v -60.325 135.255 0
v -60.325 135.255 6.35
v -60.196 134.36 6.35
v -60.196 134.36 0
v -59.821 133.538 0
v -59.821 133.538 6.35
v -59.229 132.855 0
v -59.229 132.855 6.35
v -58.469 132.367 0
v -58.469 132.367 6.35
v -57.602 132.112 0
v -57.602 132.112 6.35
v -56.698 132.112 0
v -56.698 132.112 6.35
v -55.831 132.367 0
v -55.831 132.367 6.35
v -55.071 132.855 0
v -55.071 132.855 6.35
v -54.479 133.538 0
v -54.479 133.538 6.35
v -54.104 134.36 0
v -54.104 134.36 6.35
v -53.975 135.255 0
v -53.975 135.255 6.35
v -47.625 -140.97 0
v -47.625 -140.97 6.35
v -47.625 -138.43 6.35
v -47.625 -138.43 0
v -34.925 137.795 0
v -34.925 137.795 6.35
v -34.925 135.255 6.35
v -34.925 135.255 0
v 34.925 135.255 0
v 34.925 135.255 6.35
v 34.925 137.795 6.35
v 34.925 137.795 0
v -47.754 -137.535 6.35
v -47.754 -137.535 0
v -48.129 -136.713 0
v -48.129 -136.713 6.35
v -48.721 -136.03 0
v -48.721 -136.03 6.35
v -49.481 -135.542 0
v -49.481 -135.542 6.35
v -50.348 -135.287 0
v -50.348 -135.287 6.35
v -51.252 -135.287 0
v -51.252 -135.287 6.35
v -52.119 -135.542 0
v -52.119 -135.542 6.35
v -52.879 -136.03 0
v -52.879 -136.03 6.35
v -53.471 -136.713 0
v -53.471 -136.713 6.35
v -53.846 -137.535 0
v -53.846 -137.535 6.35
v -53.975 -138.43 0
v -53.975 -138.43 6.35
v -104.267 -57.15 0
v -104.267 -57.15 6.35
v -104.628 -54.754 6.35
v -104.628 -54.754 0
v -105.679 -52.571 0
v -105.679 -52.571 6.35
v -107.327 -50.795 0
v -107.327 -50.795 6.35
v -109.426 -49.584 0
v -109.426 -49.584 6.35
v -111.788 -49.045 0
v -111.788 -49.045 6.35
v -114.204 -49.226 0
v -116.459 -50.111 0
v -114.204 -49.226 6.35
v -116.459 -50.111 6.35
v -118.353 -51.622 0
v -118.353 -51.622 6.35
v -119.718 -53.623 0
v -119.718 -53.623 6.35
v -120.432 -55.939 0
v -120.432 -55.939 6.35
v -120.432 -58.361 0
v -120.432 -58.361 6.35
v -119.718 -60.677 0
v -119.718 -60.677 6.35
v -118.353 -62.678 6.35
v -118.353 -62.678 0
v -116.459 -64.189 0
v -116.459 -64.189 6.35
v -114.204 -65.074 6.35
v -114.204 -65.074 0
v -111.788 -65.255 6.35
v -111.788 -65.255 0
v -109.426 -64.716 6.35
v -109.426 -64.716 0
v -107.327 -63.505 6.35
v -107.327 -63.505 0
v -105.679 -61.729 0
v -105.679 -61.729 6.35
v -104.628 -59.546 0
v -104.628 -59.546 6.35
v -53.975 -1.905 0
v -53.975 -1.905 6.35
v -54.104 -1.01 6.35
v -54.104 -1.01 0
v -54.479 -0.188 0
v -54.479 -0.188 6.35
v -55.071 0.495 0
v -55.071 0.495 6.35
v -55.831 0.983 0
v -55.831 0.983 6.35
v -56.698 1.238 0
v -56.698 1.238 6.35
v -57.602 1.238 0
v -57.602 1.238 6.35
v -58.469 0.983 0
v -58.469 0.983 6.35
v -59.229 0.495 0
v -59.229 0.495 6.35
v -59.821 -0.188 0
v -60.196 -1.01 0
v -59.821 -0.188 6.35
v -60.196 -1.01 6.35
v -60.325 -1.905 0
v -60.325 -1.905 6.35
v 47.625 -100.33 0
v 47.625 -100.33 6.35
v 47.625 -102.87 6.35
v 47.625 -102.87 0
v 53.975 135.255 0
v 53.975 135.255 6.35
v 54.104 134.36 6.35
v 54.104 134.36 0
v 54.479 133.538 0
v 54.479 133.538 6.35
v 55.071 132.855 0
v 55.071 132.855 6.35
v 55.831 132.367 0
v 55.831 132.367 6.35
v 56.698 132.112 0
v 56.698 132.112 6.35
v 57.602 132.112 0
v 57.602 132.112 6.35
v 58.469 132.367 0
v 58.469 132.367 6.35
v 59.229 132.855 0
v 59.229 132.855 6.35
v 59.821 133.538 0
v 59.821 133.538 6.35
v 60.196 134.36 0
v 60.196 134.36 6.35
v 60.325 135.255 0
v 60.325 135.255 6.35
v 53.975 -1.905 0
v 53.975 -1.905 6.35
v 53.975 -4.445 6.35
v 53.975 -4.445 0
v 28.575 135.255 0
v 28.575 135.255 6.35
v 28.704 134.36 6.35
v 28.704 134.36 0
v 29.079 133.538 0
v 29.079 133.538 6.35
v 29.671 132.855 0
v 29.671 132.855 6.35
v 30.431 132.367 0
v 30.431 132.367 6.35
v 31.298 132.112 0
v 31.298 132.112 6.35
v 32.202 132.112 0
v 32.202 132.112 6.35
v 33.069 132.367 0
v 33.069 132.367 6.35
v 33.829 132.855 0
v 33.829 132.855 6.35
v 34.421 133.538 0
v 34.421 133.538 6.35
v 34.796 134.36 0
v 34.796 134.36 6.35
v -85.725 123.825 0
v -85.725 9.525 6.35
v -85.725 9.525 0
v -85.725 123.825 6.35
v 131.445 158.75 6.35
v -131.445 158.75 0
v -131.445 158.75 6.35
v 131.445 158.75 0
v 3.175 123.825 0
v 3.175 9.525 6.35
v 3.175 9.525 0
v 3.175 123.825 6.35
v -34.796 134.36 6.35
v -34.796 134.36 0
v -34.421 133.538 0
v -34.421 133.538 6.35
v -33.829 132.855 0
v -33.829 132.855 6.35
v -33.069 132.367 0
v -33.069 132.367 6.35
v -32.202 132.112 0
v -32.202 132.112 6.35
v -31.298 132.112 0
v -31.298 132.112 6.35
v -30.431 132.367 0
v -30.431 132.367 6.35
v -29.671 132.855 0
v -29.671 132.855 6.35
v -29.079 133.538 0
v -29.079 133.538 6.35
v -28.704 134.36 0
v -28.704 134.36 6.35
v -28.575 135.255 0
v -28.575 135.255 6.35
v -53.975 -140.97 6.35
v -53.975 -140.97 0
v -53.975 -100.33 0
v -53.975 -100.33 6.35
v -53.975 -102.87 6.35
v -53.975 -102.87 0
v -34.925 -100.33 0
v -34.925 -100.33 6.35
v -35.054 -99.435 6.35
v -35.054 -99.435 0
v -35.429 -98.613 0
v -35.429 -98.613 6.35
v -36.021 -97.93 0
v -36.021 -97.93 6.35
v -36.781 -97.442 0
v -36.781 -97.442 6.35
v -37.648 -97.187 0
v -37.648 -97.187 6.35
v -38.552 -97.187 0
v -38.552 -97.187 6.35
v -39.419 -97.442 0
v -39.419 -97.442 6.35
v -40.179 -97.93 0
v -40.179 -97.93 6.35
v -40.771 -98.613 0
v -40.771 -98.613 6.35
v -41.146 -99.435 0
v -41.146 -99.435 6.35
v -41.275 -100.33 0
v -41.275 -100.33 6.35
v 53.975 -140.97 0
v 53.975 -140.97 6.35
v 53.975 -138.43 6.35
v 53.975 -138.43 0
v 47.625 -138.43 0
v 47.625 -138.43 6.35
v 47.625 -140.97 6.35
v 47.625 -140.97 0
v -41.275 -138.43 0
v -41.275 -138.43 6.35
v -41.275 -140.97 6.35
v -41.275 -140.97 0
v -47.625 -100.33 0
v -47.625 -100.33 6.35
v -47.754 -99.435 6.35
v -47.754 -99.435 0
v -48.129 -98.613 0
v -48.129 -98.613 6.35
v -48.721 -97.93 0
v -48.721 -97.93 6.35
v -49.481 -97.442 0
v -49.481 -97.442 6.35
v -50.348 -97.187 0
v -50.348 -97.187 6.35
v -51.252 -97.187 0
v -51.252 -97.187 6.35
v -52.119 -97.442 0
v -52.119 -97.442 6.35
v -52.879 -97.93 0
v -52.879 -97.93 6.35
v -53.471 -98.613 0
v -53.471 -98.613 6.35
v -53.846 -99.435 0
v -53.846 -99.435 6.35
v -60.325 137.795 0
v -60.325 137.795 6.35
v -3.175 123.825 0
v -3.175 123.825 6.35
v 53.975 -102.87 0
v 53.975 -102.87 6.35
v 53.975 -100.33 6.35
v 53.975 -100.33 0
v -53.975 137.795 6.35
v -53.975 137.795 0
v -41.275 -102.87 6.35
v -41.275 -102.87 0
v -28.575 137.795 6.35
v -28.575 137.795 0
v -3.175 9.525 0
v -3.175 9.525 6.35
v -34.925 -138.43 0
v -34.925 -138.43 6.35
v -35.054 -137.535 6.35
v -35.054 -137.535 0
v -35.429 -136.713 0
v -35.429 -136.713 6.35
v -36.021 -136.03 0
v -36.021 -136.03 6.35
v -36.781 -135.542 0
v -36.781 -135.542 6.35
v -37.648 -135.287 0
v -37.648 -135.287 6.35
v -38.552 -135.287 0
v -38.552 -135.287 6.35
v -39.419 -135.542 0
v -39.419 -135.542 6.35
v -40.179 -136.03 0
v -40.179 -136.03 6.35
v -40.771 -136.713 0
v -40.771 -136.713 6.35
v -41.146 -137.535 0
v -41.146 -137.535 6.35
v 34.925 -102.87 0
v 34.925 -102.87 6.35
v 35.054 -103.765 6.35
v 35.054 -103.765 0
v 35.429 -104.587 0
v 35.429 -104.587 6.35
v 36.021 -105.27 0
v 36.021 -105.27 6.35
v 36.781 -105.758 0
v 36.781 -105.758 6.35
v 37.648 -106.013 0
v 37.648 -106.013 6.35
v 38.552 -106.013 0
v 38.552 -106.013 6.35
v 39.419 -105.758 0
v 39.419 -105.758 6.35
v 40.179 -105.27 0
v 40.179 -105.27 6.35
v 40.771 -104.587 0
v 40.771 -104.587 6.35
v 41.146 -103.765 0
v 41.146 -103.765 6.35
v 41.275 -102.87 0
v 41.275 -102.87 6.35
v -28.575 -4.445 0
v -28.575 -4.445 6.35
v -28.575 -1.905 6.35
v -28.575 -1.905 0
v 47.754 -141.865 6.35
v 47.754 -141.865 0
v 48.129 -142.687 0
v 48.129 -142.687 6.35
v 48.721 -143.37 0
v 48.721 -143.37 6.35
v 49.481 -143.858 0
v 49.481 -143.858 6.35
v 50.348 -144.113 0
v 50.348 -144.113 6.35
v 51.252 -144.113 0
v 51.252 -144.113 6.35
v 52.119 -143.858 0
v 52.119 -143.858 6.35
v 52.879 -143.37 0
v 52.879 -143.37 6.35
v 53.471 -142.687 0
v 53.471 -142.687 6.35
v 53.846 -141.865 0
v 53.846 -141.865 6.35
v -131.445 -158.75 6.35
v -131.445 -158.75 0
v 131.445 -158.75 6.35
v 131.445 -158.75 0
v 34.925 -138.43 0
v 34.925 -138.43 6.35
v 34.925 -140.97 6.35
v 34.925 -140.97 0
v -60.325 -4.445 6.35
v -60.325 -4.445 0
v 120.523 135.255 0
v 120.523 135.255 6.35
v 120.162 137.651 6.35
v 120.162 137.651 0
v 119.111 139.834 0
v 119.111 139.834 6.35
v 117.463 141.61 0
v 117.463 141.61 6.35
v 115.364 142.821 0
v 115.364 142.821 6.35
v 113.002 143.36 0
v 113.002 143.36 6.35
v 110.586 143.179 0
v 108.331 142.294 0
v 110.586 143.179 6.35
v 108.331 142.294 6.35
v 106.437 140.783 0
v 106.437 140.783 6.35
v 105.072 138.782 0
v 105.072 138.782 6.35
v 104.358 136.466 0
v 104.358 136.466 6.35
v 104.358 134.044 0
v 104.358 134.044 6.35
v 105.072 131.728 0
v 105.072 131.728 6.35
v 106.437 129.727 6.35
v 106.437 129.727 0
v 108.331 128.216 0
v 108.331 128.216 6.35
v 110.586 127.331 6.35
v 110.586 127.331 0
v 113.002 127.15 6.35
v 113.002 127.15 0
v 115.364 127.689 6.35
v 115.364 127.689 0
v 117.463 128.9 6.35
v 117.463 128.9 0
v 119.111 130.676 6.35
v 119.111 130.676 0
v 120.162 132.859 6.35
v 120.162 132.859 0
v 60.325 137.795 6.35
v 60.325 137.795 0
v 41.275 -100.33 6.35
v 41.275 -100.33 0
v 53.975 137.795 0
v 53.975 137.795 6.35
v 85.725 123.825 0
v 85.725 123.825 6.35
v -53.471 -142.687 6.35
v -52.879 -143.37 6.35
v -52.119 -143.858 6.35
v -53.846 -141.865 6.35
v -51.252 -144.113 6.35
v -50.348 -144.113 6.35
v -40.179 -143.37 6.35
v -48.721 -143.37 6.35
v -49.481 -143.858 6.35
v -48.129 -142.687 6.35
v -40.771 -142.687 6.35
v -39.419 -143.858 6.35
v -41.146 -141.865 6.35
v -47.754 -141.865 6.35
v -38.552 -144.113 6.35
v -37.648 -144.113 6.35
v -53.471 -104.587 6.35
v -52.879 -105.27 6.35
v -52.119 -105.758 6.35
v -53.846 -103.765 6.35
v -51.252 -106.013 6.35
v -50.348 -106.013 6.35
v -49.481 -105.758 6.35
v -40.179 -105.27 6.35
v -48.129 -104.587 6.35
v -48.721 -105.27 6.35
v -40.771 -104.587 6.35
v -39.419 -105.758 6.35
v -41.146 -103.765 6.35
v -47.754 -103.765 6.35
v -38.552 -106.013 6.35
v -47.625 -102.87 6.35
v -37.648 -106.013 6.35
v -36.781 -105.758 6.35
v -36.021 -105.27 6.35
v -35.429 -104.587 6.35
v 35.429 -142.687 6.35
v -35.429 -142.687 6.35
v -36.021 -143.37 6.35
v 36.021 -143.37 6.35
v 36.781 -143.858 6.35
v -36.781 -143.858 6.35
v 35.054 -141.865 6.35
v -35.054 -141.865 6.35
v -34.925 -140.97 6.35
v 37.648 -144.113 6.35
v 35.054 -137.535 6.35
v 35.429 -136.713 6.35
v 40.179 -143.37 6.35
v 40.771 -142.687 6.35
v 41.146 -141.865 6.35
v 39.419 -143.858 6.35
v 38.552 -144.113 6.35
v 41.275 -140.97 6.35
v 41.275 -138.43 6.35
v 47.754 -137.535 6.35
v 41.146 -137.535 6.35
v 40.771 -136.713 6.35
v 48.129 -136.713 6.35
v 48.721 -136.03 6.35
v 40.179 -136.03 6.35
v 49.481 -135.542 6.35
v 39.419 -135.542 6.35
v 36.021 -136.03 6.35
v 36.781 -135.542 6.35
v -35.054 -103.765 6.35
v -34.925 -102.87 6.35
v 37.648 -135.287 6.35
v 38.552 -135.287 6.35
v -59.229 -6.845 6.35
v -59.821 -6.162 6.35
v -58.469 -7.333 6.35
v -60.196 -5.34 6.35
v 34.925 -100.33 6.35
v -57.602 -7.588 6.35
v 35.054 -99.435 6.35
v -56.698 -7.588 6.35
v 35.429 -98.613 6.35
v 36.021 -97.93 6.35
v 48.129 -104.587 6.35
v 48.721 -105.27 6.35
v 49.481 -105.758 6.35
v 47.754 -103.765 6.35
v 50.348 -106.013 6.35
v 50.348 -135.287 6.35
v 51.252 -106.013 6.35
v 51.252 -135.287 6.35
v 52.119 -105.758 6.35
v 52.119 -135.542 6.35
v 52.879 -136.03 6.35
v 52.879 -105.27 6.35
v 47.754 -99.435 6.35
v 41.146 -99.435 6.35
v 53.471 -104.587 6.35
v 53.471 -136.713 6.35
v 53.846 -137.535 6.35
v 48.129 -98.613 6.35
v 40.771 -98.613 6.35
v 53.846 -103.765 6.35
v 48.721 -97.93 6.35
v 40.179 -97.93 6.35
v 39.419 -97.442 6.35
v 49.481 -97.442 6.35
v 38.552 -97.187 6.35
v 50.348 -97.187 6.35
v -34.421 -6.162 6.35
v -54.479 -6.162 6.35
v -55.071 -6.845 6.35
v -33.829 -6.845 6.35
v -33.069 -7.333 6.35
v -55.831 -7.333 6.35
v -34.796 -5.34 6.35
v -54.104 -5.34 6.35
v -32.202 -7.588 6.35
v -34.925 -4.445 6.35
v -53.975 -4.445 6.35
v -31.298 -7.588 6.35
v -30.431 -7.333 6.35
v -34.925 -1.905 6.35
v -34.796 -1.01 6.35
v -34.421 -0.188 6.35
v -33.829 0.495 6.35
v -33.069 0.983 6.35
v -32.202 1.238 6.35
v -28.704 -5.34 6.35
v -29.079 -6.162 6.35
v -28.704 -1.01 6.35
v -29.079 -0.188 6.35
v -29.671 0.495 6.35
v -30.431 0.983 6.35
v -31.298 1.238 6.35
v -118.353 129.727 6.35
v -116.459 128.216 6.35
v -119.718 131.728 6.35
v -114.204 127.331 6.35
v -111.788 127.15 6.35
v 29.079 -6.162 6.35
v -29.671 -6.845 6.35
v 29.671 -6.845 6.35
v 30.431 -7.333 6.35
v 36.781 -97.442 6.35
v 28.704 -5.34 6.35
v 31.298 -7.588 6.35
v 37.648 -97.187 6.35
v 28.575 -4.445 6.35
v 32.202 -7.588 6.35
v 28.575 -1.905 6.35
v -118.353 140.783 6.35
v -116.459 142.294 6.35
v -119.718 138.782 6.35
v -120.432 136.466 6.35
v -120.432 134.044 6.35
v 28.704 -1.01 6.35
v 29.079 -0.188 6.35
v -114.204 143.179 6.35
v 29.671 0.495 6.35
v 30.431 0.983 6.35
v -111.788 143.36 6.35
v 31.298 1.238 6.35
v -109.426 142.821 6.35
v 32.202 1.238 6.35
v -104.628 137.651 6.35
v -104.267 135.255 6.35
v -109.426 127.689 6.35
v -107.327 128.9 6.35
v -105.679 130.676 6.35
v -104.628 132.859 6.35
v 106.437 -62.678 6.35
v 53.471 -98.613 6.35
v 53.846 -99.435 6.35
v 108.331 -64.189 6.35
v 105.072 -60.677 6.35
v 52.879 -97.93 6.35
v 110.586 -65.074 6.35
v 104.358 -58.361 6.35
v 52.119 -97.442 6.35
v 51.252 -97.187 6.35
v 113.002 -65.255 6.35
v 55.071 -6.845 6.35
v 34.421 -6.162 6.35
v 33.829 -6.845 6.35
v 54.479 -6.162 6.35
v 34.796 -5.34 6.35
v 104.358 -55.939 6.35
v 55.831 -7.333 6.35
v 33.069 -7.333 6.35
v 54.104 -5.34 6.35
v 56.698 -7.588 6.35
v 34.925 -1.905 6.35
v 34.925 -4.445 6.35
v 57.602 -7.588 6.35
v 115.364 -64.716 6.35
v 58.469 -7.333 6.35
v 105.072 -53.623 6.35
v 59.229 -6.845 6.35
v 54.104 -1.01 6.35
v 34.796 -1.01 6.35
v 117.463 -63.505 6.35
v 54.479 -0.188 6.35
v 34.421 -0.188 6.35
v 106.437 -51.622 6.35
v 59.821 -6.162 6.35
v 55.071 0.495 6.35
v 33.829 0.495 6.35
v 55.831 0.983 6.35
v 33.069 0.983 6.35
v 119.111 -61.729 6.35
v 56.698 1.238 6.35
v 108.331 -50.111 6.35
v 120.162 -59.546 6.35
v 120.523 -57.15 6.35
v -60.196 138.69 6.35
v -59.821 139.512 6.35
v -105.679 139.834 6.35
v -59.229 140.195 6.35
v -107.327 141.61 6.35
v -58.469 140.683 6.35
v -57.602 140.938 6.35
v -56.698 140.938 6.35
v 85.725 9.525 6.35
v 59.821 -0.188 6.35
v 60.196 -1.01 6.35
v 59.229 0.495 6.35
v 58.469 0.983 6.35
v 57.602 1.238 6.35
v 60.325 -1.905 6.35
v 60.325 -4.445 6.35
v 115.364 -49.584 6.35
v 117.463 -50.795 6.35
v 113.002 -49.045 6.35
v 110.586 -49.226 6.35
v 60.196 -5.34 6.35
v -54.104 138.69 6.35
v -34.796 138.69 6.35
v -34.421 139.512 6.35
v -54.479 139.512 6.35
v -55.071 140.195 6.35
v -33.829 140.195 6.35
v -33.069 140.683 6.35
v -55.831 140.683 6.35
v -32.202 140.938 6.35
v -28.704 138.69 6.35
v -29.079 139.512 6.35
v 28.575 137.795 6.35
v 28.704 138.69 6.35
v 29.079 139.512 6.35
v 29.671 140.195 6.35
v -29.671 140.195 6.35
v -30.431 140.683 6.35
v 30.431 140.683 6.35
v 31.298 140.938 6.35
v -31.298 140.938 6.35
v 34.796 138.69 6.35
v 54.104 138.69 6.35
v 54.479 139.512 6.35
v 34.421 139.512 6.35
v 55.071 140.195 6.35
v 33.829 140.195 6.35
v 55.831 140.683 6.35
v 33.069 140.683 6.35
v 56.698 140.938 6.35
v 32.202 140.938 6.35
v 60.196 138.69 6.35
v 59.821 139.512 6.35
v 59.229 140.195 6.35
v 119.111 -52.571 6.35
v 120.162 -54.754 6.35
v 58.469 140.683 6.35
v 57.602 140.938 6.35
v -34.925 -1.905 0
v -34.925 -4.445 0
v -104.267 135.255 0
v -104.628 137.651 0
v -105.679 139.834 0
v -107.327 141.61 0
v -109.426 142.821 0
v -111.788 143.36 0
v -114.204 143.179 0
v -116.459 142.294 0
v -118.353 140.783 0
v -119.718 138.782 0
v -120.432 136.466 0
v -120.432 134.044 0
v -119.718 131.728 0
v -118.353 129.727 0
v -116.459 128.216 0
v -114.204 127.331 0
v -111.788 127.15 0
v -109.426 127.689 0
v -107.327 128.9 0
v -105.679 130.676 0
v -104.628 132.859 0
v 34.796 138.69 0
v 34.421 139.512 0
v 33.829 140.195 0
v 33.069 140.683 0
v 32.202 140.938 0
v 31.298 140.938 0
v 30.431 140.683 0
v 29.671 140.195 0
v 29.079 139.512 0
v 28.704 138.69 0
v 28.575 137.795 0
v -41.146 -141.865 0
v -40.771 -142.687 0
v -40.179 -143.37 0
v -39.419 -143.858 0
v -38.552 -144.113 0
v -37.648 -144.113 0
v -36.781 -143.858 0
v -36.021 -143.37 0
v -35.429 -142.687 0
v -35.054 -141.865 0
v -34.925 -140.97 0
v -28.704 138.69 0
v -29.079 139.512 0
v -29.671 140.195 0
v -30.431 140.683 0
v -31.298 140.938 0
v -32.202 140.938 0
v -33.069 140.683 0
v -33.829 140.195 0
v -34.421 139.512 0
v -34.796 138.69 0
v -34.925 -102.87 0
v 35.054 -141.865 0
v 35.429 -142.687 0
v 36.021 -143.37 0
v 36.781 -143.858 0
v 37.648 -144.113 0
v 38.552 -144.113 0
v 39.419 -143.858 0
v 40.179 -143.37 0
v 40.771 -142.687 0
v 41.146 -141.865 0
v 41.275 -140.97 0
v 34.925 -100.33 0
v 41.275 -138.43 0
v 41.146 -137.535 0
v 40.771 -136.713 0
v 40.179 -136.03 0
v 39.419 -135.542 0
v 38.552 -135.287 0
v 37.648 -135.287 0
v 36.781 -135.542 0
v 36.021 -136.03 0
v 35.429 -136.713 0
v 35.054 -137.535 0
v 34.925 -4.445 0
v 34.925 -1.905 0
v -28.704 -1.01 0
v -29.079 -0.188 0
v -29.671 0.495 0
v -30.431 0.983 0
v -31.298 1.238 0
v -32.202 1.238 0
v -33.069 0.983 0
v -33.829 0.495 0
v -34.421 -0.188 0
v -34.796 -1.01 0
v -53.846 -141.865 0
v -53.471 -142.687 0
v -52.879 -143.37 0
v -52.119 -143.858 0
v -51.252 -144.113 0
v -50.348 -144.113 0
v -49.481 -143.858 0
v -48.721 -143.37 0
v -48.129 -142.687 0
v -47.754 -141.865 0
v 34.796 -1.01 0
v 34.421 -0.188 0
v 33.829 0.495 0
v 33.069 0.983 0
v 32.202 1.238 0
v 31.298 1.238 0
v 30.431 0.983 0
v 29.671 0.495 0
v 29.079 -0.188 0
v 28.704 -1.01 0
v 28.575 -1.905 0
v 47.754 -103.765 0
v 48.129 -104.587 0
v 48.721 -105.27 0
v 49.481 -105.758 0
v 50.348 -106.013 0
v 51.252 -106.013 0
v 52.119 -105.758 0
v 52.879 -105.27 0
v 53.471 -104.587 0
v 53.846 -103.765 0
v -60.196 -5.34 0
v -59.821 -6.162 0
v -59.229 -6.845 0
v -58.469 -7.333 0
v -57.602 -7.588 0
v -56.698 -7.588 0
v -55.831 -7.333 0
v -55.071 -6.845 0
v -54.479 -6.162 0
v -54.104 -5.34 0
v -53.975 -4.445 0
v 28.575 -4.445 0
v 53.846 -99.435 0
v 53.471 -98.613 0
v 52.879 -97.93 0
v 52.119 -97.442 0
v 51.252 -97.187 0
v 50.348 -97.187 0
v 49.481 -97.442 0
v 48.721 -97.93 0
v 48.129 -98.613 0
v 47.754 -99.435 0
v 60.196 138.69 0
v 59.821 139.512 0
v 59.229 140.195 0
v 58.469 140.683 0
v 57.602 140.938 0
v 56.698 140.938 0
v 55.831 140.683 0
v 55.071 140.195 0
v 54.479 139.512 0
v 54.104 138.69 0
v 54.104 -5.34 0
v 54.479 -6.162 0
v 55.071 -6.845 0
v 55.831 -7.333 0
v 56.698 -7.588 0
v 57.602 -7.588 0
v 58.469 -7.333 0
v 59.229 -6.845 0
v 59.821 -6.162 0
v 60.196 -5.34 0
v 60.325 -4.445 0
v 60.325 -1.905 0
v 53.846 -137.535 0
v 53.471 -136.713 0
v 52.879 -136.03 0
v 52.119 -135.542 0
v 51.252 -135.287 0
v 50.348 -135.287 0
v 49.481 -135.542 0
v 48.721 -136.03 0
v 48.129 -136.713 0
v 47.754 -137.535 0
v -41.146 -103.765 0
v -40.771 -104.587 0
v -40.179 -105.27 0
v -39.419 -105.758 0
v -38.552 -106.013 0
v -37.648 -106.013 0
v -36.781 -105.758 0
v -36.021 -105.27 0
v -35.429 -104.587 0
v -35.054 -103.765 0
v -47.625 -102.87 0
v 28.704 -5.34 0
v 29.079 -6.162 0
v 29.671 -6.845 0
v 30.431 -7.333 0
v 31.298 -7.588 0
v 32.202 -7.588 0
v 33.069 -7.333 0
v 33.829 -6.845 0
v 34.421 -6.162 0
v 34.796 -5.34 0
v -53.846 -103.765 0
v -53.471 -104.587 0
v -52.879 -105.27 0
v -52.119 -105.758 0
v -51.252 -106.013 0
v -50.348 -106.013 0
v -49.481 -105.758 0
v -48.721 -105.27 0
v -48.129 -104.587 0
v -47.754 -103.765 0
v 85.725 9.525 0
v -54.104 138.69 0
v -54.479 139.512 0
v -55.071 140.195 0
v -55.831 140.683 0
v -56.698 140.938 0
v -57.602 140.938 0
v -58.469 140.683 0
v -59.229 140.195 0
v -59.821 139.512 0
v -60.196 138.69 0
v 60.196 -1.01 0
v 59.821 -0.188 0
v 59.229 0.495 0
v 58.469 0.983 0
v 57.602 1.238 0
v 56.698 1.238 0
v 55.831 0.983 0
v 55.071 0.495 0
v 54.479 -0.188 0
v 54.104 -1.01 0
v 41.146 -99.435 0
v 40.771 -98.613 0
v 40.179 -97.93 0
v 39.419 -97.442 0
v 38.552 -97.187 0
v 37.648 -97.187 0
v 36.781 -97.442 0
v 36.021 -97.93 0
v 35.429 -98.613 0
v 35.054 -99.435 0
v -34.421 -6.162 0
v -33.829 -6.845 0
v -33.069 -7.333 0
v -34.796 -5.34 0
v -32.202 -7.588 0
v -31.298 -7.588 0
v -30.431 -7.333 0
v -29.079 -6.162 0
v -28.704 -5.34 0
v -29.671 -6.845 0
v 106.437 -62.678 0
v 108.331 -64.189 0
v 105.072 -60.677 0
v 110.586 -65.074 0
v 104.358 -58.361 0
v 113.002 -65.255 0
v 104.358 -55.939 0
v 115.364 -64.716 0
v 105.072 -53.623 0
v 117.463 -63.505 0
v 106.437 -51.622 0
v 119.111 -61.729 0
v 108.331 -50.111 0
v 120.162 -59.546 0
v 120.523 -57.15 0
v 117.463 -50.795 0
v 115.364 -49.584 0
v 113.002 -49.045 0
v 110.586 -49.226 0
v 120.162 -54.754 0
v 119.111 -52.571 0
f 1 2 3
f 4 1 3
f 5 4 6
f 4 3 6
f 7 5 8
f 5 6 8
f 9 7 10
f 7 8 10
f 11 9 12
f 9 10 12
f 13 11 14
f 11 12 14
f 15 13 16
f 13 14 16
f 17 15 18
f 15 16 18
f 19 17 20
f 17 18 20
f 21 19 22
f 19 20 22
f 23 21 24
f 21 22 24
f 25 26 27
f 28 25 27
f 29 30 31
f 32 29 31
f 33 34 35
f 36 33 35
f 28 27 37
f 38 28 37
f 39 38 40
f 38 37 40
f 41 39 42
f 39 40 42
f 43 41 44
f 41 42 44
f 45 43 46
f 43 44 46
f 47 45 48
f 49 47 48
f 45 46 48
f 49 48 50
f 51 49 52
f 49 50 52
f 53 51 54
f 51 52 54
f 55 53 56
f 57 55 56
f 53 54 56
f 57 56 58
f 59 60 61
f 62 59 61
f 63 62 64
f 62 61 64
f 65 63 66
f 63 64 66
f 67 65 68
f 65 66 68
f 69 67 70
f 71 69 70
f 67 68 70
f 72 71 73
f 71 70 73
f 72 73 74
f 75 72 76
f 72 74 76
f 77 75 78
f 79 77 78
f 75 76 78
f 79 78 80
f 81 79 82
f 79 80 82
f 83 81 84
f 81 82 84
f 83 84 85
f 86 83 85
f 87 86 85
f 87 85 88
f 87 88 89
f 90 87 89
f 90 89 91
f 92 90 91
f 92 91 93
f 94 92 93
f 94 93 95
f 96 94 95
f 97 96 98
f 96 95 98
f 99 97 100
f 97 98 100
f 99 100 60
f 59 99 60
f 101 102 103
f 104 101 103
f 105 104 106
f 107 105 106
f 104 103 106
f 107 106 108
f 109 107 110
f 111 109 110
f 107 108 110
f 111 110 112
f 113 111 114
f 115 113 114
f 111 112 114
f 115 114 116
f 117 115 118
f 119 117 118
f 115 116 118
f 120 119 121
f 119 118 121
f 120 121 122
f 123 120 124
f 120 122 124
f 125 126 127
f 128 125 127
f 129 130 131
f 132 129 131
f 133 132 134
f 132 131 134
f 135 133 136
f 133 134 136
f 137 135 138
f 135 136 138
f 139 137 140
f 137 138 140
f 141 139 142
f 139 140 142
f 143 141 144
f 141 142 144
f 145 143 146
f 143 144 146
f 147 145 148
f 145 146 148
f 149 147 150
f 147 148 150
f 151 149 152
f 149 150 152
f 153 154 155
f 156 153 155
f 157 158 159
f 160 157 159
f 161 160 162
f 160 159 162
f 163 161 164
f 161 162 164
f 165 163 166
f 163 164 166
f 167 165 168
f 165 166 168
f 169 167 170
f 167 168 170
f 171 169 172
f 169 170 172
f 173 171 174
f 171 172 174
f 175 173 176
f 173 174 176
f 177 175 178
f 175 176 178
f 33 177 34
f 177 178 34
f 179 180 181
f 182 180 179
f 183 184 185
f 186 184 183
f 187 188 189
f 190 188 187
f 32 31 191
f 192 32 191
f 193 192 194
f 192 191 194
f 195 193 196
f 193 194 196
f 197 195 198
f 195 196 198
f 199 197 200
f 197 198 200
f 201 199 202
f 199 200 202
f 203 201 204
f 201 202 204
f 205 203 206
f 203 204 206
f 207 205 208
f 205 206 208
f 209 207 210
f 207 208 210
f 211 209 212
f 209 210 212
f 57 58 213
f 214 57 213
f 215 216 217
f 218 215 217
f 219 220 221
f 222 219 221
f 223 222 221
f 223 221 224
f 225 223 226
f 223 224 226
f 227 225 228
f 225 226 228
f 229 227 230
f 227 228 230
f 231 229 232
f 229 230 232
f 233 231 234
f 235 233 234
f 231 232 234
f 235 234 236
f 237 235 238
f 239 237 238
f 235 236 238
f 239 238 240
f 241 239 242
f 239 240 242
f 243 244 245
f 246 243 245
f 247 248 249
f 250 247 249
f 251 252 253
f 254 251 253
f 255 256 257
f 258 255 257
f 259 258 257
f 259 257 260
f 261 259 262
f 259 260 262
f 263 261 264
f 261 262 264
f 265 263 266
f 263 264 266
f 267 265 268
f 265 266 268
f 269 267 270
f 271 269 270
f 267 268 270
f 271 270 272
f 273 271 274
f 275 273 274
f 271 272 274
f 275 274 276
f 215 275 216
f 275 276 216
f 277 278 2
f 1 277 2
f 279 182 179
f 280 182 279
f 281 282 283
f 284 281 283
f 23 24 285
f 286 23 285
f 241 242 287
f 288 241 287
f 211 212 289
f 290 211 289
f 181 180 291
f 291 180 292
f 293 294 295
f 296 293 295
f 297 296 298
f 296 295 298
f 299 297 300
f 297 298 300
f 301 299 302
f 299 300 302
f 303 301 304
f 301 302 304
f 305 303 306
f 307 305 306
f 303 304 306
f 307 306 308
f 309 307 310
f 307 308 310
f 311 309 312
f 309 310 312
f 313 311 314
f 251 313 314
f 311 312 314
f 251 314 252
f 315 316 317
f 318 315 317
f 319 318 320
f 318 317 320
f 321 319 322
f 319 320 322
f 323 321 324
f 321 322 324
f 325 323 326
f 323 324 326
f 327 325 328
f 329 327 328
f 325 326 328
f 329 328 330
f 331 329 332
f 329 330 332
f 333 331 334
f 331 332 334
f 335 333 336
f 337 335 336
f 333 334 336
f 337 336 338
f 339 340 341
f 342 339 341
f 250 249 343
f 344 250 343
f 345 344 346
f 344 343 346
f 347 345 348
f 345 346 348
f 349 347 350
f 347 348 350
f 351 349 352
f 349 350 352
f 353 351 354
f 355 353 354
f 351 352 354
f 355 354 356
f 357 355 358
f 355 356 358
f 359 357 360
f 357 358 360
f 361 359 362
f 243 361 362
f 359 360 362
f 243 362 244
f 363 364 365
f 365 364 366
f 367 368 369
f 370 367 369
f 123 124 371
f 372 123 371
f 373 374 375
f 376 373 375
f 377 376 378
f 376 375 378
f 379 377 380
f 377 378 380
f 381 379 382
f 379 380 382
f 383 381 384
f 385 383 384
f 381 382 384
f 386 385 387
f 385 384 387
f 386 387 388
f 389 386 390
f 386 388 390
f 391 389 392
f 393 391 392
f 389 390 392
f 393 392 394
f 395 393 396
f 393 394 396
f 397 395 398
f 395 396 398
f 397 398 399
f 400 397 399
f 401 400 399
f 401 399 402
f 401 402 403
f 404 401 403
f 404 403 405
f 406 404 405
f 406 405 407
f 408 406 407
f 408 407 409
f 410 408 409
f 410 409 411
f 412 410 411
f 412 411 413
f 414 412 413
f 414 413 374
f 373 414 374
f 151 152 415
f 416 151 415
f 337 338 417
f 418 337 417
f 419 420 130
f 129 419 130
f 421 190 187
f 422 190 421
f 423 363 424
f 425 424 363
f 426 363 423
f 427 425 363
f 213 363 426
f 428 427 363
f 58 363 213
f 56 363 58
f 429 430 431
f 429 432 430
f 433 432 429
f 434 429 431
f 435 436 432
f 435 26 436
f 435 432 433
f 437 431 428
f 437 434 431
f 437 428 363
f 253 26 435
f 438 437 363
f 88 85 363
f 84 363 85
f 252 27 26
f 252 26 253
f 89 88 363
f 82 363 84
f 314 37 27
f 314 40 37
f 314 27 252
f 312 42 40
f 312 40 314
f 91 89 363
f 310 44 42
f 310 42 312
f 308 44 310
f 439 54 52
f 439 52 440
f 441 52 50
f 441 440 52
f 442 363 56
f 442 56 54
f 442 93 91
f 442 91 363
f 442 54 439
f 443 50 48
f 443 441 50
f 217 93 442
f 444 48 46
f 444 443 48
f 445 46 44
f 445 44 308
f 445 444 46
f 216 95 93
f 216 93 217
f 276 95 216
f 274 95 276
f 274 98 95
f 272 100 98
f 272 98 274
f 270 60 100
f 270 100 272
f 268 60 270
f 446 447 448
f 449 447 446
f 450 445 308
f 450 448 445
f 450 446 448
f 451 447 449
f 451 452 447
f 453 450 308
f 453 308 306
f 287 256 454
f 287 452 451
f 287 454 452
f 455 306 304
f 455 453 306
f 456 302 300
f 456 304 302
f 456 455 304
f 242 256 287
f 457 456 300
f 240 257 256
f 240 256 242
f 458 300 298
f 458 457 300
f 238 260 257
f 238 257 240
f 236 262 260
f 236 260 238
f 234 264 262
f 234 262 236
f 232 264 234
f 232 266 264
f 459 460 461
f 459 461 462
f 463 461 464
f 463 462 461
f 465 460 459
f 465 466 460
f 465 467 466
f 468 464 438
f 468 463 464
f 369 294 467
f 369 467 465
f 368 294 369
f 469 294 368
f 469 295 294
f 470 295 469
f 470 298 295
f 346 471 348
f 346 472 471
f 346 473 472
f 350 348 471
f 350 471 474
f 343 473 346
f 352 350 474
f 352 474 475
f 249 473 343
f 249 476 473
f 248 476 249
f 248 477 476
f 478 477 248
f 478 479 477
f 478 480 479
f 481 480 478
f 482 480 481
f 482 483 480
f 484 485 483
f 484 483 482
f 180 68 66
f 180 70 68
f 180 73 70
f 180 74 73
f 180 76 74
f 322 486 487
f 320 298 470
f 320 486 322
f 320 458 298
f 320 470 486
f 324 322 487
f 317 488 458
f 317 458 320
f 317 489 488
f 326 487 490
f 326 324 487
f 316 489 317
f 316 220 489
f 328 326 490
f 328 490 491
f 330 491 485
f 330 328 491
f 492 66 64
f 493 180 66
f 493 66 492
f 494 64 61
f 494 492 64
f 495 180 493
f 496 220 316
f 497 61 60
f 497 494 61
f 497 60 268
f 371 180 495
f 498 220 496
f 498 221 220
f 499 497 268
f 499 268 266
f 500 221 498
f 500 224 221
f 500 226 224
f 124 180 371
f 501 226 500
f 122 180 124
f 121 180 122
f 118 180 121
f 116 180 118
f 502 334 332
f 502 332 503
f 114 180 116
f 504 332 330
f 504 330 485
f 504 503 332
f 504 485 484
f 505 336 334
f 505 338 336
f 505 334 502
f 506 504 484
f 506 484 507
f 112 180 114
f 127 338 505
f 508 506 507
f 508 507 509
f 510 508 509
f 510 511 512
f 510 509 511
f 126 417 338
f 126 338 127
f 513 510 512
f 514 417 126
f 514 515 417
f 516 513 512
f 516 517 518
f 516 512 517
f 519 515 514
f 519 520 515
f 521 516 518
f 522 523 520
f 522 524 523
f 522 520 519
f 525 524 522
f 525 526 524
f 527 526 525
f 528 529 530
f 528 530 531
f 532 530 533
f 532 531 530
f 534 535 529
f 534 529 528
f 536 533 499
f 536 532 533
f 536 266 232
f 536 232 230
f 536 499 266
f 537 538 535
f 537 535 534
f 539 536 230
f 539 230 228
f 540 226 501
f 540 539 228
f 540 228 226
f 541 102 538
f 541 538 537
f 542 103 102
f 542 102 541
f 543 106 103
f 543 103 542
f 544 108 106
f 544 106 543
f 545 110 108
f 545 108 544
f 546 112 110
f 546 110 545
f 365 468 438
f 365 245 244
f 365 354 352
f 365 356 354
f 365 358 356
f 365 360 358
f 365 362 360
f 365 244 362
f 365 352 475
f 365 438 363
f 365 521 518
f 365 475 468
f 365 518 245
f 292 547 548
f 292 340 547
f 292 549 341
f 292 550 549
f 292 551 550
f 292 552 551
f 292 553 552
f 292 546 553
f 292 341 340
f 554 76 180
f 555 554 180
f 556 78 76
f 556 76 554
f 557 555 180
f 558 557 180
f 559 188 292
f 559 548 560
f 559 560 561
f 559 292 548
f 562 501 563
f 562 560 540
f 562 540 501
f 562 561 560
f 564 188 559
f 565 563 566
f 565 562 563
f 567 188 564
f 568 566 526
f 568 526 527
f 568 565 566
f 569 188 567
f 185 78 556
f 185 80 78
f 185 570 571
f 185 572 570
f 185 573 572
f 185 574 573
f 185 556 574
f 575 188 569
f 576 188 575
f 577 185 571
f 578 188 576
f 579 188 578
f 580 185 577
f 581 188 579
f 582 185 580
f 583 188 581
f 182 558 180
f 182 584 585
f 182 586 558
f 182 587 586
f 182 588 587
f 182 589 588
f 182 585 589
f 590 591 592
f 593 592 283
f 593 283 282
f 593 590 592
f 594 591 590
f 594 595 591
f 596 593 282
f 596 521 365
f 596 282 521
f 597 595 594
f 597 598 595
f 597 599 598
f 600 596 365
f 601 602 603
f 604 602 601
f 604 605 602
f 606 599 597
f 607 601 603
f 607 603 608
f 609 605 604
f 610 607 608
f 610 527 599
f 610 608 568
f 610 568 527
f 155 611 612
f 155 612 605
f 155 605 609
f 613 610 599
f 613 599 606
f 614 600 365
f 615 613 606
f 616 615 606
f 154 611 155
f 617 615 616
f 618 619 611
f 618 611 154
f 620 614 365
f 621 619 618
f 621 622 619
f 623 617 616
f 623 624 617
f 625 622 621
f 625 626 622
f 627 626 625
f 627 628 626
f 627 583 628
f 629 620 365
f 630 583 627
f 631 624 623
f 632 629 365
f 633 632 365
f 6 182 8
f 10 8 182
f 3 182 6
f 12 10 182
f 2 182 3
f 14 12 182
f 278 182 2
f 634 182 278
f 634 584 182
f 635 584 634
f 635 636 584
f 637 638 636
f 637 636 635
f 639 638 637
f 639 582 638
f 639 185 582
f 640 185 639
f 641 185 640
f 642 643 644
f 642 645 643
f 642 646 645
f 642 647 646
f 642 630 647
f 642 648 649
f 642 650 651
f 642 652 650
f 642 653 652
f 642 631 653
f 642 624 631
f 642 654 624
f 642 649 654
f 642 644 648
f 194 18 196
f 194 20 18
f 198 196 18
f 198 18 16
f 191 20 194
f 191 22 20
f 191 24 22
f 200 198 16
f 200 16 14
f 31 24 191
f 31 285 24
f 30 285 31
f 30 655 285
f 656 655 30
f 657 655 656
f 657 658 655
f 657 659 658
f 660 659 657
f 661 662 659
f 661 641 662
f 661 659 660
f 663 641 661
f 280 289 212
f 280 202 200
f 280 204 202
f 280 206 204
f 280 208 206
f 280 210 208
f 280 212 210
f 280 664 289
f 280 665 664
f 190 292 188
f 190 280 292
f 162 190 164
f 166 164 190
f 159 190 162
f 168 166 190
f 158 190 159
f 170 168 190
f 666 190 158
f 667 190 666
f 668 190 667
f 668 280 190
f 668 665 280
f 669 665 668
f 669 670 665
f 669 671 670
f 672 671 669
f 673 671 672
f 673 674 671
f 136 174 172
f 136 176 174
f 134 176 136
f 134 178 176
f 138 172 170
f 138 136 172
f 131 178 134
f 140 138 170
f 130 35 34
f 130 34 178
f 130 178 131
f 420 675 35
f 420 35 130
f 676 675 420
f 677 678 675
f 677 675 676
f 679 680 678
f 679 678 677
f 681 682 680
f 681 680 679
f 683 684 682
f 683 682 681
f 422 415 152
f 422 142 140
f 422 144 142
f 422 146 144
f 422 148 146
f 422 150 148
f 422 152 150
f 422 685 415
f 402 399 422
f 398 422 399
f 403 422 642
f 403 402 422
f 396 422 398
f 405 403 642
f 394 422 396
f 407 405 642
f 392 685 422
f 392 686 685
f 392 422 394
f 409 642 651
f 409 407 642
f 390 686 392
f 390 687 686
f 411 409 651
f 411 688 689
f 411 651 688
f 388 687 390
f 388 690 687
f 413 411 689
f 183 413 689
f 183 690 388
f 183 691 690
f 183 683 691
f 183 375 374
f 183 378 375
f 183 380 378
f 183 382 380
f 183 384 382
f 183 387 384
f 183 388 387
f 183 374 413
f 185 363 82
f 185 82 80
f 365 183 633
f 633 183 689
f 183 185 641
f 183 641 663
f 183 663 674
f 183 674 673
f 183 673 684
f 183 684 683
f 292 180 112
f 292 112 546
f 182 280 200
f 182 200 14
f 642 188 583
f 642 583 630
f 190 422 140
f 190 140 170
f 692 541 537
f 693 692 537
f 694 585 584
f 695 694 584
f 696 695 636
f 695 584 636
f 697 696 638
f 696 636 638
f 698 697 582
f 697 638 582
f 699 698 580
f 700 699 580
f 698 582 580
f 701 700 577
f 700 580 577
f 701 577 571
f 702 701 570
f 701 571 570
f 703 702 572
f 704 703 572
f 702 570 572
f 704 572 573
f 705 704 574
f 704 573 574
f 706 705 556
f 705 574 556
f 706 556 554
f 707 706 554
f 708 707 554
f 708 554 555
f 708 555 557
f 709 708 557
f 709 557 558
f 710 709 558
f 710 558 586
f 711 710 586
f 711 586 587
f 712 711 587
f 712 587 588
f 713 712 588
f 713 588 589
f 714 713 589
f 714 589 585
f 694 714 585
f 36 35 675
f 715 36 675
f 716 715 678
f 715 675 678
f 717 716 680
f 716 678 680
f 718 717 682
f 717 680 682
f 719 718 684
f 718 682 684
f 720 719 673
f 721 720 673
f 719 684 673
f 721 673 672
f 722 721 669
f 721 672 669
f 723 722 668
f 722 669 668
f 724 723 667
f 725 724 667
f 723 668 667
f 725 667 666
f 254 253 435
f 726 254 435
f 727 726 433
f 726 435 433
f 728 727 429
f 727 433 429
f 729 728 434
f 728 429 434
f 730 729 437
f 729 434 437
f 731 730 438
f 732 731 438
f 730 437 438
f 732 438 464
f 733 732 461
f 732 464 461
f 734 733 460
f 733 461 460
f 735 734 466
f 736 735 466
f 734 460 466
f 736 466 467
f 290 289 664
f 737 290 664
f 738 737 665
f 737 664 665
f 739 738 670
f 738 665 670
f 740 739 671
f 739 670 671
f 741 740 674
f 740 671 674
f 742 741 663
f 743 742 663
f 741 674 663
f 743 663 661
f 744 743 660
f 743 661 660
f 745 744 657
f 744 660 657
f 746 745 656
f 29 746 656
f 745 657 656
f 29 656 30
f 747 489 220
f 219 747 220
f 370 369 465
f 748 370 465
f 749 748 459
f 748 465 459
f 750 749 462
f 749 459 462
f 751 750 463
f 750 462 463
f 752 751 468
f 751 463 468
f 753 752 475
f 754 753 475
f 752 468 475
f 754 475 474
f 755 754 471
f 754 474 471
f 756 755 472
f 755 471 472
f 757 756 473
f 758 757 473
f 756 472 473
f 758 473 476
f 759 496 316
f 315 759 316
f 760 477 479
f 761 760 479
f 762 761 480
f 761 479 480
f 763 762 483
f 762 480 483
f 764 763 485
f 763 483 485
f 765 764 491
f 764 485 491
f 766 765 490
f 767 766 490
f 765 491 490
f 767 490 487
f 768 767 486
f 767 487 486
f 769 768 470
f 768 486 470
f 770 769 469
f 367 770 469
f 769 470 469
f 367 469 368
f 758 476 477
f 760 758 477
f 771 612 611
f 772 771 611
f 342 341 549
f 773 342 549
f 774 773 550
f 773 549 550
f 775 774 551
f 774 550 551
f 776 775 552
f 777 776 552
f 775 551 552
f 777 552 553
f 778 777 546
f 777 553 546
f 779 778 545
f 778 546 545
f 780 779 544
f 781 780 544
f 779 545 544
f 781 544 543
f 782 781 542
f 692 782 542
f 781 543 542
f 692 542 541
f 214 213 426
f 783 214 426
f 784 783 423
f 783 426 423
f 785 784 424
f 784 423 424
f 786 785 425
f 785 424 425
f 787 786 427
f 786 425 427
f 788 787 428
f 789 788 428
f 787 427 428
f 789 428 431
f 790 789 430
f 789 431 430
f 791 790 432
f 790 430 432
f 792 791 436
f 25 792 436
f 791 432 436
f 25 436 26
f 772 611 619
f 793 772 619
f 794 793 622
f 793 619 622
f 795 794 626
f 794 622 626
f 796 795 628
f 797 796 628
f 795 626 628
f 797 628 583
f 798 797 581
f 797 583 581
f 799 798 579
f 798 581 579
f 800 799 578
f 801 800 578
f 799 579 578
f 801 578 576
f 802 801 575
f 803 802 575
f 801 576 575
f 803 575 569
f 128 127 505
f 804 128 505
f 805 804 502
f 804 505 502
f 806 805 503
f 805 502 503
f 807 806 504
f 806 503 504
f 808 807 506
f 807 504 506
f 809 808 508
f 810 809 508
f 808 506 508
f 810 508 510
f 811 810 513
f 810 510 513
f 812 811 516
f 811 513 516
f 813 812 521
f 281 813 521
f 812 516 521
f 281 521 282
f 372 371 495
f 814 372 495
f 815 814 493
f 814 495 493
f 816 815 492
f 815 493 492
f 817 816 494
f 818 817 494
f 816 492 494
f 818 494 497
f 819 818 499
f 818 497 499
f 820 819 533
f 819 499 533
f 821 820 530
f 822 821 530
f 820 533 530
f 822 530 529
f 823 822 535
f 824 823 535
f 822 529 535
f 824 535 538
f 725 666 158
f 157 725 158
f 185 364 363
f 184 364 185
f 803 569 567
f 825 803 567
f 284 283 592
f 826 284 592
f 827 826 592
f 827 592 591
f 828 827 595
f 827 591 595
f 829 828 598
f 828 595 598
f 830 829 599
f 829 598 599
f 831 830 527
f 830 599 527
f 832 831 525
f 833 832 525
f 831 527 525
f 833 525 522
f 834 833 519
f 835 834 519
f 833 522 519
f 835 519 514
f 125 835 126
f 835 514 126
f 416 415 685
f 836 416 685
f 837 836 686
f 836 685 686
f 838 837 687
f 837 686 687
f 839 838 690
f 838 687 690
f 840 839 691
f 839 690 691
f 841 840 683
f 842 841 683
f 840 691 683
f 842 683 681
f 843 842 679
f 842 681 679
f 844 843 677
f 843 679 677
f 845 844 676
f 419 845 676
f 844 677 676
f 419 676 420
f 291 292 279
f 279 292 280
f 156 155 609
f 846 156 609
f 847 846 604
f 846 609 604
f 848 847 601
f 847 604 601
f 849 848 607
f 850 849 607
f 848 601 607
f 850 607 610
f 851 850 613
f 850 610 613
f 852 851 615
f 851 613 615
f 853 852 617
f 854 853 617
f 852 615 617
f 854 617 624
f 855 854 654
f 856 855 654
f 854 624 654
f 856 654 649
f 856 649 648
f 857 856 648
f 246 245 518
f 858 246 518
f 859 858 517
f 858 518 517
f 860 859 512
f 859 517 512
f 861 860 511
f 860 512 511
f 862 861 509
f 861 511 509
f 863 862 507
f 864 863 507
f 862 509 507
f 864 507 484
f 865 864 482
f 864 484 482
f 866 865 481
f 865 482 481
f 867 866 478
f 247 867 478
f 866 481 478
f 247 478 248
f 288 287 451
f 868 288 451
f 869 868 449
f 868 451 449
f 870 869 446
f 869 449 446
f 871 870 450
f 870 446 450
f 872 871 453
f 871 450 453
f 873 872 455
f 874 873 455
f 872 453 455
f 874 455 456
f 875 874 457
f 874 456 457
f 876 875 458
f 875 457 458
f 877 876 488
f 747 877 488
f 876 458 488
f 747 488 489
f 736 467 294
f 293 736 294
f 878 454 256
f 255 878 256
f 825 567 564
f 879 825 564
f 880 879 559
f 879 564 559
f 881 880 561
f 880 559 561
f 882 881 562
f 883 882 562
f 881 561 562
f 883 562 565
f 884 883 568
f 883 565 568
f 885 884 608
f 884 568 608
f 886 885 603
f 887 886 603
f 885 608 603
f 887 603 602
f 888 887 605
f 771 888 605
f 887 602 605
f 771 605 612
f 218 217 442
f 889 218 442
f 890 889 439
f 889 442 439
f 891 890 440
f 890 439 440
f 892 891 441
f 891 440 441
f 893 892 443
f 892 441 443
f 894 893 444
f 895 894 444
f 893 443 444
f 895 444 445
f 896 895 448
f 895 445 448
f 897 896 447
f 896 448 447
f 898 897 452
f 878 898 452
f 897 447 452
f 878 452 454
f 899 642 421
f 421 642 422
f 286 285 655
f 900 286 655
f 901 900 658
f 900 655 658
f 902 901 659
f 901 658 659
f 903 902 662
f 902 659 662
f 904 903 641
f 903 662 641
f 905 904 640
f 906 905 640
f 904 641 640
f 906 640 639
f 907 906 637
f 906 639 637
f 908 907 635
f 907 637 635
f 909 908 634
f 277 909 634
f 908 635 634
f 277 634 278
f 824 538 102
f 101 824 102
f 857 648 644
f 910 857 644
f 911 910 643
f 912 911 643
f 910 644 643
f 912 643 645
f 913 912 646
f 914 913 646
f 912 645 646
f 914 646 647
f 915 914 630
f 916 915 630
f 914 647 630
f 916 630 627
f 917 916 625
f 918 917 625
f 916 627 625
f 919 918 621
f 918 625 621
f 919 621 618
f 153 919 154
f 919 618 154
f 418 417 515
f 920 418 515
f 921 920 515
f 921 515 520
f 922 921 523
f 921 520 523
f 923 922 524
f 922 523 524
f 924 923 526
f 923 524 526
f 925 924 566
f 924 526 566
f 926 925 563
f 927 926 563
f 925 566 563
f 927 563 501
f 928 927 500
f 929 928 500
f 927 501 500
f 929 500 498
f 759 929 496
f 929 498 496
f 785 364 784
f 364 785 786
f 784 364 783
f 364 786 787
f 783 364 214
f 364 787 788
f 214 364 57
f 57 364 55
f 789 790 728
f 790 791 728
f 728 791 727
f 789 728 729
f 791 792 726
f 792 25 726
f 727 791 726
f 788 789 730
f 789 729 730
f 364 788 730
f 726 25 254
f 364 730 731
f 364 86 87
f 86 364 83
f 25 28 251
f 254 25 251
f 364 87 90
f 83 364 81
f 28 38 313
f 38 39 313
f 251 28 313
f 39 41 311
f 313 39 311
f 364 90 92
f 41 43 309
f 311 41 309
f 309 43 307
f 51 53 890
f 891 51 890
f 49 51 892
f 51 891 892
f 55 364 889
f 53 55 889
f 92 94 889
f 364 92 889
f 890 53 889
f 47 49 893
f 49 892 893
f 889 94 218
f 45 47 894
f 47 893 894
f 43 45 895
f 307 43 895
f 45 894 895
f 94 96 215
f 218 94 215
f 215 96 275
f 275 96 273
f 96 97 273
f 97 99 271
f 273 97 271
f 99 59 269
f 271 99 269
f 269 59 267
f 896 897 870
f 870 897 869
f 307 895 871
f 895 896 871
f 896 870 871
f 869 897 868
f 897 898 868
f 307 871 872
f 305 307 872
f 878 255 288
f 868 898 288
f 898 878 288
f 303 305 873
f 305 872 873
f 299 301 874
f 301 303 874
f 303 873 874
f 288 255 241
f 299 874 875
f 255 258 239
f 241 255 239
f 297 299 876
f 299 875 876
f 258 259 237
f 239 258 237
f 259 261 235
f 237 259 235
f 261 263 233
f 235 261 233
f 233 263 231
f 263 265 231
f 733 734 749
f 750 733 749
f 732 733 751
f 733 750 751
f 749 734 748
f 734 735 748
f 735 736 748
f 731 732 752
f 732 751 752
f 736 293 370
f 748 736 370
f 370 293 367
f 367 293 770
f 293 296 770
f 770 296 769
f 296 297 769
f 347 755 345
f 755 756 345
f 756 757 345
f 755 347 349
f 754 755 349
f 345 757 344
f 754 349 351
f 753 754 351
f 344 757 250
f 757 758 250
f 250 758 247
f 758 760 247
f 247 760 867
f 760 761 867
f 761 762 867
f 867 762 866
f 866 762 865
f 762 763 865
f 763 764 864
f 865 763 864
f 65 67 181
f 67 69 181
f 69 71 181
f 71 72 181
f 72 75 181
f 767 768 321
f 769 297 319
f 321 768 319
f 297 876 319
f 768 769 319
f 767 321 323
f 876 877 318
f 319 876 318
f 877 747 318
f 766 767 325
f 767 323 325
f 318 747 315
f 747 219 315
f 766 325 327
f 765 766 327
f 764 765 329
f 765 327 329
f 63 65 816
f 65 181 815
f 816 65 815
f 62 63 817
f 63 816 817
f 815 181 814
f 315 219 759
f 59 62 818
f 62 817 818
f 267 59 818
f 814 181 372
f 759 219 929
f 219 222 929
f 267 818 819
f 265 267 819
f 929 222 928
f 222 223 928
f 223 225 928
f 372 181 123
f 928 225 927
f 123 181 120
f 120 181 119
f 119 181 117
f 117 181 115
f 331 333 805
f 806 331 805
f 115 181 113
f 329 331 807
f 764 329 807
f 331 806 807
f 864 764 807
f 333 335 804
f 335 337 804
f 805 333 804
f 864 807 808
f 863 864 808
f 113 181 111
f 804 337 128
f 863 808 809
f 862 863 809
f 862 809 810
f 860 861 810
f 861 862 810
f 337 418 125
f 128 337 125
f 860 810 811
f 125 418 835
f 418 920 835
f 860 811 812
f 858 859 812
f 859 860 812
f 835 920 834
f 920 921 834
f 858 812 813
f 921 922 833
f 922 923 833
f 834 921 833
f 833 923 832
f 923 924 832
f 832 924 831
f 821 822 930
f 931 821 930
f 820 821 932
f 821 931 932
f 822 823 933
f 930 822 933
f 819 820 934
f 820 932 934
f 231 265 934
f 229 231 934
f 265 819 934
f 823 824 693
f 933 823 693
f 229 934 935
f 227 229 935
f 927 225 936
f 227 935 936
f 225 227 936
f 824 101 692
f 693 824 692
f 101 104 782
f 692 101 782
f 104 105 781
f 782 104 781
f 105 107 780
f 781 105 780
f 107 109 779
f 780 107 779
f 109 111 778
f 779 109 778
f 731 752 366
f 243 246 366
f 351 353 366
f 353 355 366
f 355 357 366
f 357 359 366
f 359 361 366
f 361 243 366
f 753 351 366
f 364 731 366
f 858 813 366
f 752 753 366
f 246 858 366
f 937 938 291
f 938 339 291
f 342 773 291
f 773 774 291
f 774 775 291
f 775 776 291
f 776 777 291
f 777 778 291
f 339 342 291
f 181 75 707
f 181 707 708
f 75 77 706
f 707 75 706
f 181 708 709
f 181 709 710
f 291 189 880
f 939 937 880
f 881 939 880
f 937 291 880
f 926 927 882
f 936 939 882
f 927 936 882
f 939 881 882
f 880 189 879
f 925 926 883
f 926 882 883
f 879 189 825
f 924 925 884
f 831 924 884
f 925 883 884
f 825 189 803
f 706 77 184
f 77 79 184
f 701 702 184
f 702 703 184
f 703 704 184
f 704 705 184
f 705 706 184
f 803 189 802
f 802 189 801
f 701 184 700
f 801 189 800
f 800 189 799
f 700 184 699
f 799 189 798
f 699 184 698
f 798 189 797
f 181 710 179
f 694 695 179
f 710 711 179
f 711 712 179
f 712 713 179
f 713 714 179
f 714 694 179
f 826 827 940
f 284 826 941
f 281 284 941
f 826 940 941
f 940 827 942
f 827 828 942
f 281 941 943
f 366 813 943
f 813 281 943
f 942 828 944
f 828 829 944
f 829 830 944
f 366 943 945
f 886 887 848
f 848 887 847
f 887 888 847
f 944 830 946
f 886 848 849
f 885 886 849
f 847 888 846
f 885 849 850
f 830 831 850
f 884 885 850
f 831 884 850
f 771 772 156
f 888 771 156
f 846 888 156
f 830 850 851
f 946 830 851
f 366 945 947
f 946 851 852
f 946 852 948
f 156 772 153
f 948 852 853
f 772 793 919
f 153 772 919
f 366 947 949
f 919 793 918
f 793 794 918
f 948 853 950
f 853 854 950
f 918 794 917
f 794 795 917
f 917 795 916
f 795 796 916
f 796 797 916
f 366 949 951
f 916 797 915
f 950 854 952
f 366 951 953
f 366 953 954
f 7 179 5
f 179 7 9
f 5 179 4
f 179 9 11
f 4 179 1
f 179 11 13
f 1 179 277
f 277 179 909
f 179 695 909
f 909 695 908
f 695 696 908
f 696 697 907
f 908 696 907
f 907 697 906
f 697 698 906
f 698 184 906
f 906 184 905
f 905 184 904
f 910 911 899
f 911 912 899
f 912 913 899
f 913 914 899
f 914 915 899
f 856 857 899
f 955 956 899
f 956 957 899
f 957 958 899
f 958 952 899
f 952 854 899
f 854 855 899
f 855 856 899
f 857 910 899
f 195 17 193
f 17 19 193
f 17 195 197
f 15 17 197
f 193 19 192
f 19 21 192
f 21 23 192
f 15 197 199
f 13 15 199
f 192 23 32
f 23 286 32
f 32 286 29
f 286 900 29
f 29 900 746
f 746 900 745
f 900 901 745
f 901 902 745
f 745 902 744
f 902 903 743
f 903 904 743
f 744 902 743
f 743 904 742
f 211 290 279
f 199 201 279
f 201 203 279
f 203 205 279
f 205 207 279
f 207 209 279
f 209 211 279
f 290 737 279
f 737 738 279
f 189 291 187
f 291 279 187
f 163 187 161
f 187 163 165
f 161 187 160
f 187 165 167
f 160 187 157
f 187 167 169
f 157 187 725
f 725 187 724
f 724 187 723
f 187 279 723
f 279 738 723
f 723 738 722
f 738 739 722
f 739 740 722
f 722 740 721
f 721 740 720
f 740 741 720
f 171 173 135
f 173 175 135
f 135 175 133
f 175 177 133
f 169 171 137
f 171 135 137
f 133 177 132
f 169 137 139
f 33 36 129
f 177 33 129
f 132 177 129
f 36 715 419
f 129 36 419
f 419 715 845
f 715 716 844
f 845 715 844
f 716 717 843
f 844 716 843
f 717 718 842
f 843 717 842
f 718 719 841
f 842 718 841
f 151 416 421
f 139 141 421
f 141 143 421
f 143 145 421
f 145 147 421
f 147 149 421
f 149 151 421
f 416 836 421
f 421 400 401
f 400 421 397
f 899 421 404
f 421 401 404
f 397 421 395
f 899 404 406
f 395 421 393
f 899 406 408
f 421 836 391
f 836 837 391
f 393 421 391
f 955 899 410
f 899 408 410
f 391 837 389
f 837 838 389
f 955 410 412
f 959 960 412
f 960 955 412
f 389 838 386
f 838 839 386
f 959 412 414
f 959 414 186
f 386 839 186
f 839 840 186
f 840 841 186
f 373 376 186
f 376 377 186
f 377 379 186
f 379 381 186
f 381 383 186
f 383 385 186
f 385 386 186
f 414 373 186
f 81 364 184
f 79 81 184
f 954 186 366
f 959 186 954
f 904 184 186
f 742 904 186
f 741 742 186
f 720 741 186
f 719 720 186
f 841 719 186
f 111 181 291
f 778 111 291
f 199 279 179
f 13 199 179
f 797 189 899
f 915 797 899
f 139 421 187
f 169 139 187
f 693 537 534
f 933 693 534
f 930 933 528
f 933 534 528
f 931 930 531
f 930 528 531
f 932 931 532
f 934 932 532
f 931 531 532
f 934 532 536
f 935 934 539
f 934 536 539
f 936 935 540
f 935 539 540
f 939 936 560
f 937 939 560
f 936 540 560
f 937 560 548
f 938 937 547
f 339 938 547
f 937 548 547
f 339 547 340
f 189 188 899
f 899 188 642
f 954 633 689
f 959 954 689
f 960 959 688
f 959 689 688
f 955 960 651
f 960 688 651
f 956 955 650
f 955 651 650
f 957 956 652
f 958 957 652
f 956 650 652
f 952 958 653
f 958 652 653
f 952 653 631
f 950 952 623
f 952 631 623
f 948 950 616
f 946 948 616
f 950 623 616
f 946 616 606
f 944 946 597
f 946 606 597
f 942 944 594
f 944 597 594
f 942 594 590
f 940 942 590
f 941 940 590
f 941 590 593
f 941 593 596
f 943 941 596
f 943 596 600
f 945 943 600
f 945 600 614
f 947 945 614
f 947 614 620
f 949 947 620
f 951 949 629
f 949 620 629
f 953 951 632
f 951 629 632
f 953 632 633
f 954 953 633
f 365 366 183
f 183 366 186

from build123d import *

# Parameters (mm, degrees)
SKETCH1_W           = 262.89
SKETCH1_H           = 317.5
BOSS_EXTRUDE1_DEPTH = 6.35
SKETCH2_W           = 82.55
SKETCH2_H           = 114.3
SKETCH2_R           = 8.128
CUT_EXTRUDE2_DEPTH  = 6.35
SKETCH2_5_R         = 8.128
CUT_EXTRUDE4_DEPTH  = 207.202989855


with BuildPart() as part:
    # Sketch1 → Boss-Extrude1 (new body)
    with BuildSketch(Plane.XY):
        Rectangle(SKETCH1_W, SKETCH1_H)
    extrude(amount=BOSS_EXTRUDE1_DEPTH)

    # Sketch2 → Cut-Extrude2 (cut)
    with BuildSketch(Plane.XY.offset(6.35)):
        with BuildLine():
            Line((47.625, -138.43), (47.625, -139.7))
            Line((47.625, -139.7), (47.625, -140.97))
            ThreePointArc((47.625, -140.97), (50.8, -144.145), (53.975, -140.97))
            Line((53.975, -140.97), (53.975, -138.43))
            ThreePointArc((53.975, -138.43), (50.8, -135.255), (47.625, -138.43))
        make_face()
        with BuildLine():
            Line((41.275, -140.97), (41.275, -139.7))
            Line((41.275, -139.7), (41.275, -138.43))
            ThreePointArc((41.275, -138.43), (38.1, -135.255), (34.925, -138.43))
            Line((34.925, -138.43), (34.925, -140.97))
            ThreePointArc((34.925, -140.97), (38.1, -144.145), (41.275, -140.97))
        make_face()
        with BuildLine():
            Line((-53.975, -100.33), (-53.975, -102.87))
            ThreePointArc((-53.975, -102.87), (-50.8, -106.045), (-47.625, -102.87))
            Line((-47.625, -102.87), (-47.625, -100.33))
            ThreePointArc((-47.625, -100.33), (-50.8, -97.155), (-53.975, -100.33))
        make_face()
        with BuildLine():
            ThreePointArc((-41.275, -102.87), (-38.1, -106.045), (-34.925, -102.87))
            Line((-34.925, -102.87), (-34.925, -100.33))
            ThreePointArc((-34.925, -100.33), (-38.1, -97.155), (-41.275, -100.33))
            Line((-41.275, -100.33), (-41.275, -102.87))
        make_face()
        with BuildLine():
            Line((-34.925, -140.97), (-34.925, -138.43))
            ThreePointArc((-34.925, -138.43), (-38.1, -135.255), (-41.275, -138.43))
            Line((-41.275, -138.43), (-41.275, -140.97))
            ThreePointArc((-41.275, -140.97), (-38.1, -144.145), (-34.925, -140.97))
        make_face()
        with BuildLine():
            ThreePointArc((-47.625, -138.43), (-50.8, -135.255), (-53.975, -138.43))
            Line((-53.975, -138.43), (-53.975, -140.97))
            ThreePointArc((-53.975, -140.97), (-50.8, -144.145), (-47.625, -140.97))
            Line((-47.625, -140.97), (-47.625, -138.43))
        make_face()
        with BuildLine():
            Line((34.925, -100.33), (34.925, -102.87))
            ThreePointArc((34.925, -102.87), (38.1, -106.045), (41.275, -102.87))
            Line((41.275, -102.87), (41.275, -100.33))
            ThreePointArc((41.275, -100.33), (38.1, -97.155), (34.925, -100.33))
        make_face()
        with BuildLine():
            ThreePointArc((47.625, -102.87), (50.8, -106.045), (53.975, -102.87))
            Line((53.975, -102.87), (53.975, -100.33))
            ThreePointArc((53.975, -100.33), (50.8, -97.155), (47.625, -100.33))
            Line((47.625, -100.33), (47.625, -102.87))
        make_face()
        with Locations((-44.45, 66.675)):
            Rectangle(SKETCH2_W, SKETCH2_H)
        with BuildLine():
            Line((-28.575, 135.255), (-28.575, 137.795))
            ThreePointArc((-28.575, 137.795), (-31.75, 140.97), (-34.925, 137.795))
            Line((-34.925, 137.795), (-34.925, 135.255))
            ThreePointArc((-34.925, 135.255), (-31.75, 132.08), (-28.575, 135.255))
        make_face()
        with BuildLine():
            ThreePointArc((-53.975, 137.795), (-57.15, 140.97), (-60.325, 137.795))
            Line((-60.325, 137.795), (-60.325, 135.255))
            ThreePointArc((-60.325, 135.255), (-57.15, 132.08), (-53.975, 135.255))
            Line((-53.975, 135.255), (-53.975, 137.795))
        make_face()
        with BuildLine():
            ThreePointArc((-34.925, -4.445), (-31.75, -7.62), (-28.575, -4.445))
            Line((-28.575, -4.445), (-28.575, -1.905))
            ThreePointArc((-28.575, -1.905), (-31.75, 1.27), (-34.925, -1.905))
            Line((-34.925, -1.905), (-34.925, -4.445))
        make_face()
        with BuildLine():
            Line((-60.325, -1.905), (-60.325, -4.445))
            ThreePointArc((-60.325, -4.445), (-57.15, -7.62), (-53.975, -4.445))
            Line((-53.975, -4.445), (-53.975, -1.905))
            ThreePointArc((-53.975, -1.905), (-57.15, 1.27), (-60.325, -1.905))
        make_face()
        with BuildLine():
            Line((28.575, -1.905), (28.575, -4.445))
            ThreePointArc((28.575, -4.445), (31.75, -7.62), (34.925, -4.445))
            Line((34.925, -4.445), (34.925, -1.905))
            ThreePointArc((34.925, -1.905), (31.75, 1.27), (28.575, -1.905))
        make_face()
        with BuildLine():
            ThreePointArc((53.975, -4.445), (57.15, -7.62), (60.325, -4.445))
            Line((60.325, -4.445), (60.325, -1.905))
            ThreePointArc((60.325, -1.905), (57.15, 1.27), (53.975, -1.905))
            Line((53.975, -1.905), (53.975, -4.445))
        make_face()
        with Locations((44.45, 66.675)):
            Rectangle(SKETCH2_W, SKETCH2_H)
        with BuildLine():
            ThreePointArc((34.925, 137.795), (31.75, 140.97), (28.575, 137.795))
            Line((28.575, 137.795), (28.575, 135.255))
            ThreePointArc((28.575, 135.255), (31.75, 132.08), (34.925, 135.255))
            Line((34.925, 135.255), (34.925, 137.795))
        make_face()
        with BuildLine():
            Line((60.325, 135.255), (60.325, 137.795))
            ThreePointArc((60.325, 137.795), (57.15, 140.97), (53.975, 137.795))
            Line((53.975, 137.795), (53.975, 135.255))
            ThreePointArc((53.975, 135.255), (57.15, 132.08), (60.325, 135.255))
        make_face()
        with Locations((-112.395, -57.15)):
            Circle(SKETCH2_R)
        with Locations((112.395, -57.15)):
            Circle(SKETCH2_R)
    extrude(amount=-CUT_EXTRUDE2_DEPTH, mode=Mode.SUBTRACT)

    # Sketch2<5> → Cut-Extrude4 (cut, through all)
    with BuildSketch(Plane.XY.offset(6.35)):
        with Locations((-112.395, 135.255)):
            Circle(SKETCH2_5_R)
        with Locations((112.395, 135.255)):
            Circle(SKETCH2_5_R)
    extrude(amount=-CUT_EXTRUDE4_DEPTH, mode=Mode.SUBTRACT)


solid = part.part
